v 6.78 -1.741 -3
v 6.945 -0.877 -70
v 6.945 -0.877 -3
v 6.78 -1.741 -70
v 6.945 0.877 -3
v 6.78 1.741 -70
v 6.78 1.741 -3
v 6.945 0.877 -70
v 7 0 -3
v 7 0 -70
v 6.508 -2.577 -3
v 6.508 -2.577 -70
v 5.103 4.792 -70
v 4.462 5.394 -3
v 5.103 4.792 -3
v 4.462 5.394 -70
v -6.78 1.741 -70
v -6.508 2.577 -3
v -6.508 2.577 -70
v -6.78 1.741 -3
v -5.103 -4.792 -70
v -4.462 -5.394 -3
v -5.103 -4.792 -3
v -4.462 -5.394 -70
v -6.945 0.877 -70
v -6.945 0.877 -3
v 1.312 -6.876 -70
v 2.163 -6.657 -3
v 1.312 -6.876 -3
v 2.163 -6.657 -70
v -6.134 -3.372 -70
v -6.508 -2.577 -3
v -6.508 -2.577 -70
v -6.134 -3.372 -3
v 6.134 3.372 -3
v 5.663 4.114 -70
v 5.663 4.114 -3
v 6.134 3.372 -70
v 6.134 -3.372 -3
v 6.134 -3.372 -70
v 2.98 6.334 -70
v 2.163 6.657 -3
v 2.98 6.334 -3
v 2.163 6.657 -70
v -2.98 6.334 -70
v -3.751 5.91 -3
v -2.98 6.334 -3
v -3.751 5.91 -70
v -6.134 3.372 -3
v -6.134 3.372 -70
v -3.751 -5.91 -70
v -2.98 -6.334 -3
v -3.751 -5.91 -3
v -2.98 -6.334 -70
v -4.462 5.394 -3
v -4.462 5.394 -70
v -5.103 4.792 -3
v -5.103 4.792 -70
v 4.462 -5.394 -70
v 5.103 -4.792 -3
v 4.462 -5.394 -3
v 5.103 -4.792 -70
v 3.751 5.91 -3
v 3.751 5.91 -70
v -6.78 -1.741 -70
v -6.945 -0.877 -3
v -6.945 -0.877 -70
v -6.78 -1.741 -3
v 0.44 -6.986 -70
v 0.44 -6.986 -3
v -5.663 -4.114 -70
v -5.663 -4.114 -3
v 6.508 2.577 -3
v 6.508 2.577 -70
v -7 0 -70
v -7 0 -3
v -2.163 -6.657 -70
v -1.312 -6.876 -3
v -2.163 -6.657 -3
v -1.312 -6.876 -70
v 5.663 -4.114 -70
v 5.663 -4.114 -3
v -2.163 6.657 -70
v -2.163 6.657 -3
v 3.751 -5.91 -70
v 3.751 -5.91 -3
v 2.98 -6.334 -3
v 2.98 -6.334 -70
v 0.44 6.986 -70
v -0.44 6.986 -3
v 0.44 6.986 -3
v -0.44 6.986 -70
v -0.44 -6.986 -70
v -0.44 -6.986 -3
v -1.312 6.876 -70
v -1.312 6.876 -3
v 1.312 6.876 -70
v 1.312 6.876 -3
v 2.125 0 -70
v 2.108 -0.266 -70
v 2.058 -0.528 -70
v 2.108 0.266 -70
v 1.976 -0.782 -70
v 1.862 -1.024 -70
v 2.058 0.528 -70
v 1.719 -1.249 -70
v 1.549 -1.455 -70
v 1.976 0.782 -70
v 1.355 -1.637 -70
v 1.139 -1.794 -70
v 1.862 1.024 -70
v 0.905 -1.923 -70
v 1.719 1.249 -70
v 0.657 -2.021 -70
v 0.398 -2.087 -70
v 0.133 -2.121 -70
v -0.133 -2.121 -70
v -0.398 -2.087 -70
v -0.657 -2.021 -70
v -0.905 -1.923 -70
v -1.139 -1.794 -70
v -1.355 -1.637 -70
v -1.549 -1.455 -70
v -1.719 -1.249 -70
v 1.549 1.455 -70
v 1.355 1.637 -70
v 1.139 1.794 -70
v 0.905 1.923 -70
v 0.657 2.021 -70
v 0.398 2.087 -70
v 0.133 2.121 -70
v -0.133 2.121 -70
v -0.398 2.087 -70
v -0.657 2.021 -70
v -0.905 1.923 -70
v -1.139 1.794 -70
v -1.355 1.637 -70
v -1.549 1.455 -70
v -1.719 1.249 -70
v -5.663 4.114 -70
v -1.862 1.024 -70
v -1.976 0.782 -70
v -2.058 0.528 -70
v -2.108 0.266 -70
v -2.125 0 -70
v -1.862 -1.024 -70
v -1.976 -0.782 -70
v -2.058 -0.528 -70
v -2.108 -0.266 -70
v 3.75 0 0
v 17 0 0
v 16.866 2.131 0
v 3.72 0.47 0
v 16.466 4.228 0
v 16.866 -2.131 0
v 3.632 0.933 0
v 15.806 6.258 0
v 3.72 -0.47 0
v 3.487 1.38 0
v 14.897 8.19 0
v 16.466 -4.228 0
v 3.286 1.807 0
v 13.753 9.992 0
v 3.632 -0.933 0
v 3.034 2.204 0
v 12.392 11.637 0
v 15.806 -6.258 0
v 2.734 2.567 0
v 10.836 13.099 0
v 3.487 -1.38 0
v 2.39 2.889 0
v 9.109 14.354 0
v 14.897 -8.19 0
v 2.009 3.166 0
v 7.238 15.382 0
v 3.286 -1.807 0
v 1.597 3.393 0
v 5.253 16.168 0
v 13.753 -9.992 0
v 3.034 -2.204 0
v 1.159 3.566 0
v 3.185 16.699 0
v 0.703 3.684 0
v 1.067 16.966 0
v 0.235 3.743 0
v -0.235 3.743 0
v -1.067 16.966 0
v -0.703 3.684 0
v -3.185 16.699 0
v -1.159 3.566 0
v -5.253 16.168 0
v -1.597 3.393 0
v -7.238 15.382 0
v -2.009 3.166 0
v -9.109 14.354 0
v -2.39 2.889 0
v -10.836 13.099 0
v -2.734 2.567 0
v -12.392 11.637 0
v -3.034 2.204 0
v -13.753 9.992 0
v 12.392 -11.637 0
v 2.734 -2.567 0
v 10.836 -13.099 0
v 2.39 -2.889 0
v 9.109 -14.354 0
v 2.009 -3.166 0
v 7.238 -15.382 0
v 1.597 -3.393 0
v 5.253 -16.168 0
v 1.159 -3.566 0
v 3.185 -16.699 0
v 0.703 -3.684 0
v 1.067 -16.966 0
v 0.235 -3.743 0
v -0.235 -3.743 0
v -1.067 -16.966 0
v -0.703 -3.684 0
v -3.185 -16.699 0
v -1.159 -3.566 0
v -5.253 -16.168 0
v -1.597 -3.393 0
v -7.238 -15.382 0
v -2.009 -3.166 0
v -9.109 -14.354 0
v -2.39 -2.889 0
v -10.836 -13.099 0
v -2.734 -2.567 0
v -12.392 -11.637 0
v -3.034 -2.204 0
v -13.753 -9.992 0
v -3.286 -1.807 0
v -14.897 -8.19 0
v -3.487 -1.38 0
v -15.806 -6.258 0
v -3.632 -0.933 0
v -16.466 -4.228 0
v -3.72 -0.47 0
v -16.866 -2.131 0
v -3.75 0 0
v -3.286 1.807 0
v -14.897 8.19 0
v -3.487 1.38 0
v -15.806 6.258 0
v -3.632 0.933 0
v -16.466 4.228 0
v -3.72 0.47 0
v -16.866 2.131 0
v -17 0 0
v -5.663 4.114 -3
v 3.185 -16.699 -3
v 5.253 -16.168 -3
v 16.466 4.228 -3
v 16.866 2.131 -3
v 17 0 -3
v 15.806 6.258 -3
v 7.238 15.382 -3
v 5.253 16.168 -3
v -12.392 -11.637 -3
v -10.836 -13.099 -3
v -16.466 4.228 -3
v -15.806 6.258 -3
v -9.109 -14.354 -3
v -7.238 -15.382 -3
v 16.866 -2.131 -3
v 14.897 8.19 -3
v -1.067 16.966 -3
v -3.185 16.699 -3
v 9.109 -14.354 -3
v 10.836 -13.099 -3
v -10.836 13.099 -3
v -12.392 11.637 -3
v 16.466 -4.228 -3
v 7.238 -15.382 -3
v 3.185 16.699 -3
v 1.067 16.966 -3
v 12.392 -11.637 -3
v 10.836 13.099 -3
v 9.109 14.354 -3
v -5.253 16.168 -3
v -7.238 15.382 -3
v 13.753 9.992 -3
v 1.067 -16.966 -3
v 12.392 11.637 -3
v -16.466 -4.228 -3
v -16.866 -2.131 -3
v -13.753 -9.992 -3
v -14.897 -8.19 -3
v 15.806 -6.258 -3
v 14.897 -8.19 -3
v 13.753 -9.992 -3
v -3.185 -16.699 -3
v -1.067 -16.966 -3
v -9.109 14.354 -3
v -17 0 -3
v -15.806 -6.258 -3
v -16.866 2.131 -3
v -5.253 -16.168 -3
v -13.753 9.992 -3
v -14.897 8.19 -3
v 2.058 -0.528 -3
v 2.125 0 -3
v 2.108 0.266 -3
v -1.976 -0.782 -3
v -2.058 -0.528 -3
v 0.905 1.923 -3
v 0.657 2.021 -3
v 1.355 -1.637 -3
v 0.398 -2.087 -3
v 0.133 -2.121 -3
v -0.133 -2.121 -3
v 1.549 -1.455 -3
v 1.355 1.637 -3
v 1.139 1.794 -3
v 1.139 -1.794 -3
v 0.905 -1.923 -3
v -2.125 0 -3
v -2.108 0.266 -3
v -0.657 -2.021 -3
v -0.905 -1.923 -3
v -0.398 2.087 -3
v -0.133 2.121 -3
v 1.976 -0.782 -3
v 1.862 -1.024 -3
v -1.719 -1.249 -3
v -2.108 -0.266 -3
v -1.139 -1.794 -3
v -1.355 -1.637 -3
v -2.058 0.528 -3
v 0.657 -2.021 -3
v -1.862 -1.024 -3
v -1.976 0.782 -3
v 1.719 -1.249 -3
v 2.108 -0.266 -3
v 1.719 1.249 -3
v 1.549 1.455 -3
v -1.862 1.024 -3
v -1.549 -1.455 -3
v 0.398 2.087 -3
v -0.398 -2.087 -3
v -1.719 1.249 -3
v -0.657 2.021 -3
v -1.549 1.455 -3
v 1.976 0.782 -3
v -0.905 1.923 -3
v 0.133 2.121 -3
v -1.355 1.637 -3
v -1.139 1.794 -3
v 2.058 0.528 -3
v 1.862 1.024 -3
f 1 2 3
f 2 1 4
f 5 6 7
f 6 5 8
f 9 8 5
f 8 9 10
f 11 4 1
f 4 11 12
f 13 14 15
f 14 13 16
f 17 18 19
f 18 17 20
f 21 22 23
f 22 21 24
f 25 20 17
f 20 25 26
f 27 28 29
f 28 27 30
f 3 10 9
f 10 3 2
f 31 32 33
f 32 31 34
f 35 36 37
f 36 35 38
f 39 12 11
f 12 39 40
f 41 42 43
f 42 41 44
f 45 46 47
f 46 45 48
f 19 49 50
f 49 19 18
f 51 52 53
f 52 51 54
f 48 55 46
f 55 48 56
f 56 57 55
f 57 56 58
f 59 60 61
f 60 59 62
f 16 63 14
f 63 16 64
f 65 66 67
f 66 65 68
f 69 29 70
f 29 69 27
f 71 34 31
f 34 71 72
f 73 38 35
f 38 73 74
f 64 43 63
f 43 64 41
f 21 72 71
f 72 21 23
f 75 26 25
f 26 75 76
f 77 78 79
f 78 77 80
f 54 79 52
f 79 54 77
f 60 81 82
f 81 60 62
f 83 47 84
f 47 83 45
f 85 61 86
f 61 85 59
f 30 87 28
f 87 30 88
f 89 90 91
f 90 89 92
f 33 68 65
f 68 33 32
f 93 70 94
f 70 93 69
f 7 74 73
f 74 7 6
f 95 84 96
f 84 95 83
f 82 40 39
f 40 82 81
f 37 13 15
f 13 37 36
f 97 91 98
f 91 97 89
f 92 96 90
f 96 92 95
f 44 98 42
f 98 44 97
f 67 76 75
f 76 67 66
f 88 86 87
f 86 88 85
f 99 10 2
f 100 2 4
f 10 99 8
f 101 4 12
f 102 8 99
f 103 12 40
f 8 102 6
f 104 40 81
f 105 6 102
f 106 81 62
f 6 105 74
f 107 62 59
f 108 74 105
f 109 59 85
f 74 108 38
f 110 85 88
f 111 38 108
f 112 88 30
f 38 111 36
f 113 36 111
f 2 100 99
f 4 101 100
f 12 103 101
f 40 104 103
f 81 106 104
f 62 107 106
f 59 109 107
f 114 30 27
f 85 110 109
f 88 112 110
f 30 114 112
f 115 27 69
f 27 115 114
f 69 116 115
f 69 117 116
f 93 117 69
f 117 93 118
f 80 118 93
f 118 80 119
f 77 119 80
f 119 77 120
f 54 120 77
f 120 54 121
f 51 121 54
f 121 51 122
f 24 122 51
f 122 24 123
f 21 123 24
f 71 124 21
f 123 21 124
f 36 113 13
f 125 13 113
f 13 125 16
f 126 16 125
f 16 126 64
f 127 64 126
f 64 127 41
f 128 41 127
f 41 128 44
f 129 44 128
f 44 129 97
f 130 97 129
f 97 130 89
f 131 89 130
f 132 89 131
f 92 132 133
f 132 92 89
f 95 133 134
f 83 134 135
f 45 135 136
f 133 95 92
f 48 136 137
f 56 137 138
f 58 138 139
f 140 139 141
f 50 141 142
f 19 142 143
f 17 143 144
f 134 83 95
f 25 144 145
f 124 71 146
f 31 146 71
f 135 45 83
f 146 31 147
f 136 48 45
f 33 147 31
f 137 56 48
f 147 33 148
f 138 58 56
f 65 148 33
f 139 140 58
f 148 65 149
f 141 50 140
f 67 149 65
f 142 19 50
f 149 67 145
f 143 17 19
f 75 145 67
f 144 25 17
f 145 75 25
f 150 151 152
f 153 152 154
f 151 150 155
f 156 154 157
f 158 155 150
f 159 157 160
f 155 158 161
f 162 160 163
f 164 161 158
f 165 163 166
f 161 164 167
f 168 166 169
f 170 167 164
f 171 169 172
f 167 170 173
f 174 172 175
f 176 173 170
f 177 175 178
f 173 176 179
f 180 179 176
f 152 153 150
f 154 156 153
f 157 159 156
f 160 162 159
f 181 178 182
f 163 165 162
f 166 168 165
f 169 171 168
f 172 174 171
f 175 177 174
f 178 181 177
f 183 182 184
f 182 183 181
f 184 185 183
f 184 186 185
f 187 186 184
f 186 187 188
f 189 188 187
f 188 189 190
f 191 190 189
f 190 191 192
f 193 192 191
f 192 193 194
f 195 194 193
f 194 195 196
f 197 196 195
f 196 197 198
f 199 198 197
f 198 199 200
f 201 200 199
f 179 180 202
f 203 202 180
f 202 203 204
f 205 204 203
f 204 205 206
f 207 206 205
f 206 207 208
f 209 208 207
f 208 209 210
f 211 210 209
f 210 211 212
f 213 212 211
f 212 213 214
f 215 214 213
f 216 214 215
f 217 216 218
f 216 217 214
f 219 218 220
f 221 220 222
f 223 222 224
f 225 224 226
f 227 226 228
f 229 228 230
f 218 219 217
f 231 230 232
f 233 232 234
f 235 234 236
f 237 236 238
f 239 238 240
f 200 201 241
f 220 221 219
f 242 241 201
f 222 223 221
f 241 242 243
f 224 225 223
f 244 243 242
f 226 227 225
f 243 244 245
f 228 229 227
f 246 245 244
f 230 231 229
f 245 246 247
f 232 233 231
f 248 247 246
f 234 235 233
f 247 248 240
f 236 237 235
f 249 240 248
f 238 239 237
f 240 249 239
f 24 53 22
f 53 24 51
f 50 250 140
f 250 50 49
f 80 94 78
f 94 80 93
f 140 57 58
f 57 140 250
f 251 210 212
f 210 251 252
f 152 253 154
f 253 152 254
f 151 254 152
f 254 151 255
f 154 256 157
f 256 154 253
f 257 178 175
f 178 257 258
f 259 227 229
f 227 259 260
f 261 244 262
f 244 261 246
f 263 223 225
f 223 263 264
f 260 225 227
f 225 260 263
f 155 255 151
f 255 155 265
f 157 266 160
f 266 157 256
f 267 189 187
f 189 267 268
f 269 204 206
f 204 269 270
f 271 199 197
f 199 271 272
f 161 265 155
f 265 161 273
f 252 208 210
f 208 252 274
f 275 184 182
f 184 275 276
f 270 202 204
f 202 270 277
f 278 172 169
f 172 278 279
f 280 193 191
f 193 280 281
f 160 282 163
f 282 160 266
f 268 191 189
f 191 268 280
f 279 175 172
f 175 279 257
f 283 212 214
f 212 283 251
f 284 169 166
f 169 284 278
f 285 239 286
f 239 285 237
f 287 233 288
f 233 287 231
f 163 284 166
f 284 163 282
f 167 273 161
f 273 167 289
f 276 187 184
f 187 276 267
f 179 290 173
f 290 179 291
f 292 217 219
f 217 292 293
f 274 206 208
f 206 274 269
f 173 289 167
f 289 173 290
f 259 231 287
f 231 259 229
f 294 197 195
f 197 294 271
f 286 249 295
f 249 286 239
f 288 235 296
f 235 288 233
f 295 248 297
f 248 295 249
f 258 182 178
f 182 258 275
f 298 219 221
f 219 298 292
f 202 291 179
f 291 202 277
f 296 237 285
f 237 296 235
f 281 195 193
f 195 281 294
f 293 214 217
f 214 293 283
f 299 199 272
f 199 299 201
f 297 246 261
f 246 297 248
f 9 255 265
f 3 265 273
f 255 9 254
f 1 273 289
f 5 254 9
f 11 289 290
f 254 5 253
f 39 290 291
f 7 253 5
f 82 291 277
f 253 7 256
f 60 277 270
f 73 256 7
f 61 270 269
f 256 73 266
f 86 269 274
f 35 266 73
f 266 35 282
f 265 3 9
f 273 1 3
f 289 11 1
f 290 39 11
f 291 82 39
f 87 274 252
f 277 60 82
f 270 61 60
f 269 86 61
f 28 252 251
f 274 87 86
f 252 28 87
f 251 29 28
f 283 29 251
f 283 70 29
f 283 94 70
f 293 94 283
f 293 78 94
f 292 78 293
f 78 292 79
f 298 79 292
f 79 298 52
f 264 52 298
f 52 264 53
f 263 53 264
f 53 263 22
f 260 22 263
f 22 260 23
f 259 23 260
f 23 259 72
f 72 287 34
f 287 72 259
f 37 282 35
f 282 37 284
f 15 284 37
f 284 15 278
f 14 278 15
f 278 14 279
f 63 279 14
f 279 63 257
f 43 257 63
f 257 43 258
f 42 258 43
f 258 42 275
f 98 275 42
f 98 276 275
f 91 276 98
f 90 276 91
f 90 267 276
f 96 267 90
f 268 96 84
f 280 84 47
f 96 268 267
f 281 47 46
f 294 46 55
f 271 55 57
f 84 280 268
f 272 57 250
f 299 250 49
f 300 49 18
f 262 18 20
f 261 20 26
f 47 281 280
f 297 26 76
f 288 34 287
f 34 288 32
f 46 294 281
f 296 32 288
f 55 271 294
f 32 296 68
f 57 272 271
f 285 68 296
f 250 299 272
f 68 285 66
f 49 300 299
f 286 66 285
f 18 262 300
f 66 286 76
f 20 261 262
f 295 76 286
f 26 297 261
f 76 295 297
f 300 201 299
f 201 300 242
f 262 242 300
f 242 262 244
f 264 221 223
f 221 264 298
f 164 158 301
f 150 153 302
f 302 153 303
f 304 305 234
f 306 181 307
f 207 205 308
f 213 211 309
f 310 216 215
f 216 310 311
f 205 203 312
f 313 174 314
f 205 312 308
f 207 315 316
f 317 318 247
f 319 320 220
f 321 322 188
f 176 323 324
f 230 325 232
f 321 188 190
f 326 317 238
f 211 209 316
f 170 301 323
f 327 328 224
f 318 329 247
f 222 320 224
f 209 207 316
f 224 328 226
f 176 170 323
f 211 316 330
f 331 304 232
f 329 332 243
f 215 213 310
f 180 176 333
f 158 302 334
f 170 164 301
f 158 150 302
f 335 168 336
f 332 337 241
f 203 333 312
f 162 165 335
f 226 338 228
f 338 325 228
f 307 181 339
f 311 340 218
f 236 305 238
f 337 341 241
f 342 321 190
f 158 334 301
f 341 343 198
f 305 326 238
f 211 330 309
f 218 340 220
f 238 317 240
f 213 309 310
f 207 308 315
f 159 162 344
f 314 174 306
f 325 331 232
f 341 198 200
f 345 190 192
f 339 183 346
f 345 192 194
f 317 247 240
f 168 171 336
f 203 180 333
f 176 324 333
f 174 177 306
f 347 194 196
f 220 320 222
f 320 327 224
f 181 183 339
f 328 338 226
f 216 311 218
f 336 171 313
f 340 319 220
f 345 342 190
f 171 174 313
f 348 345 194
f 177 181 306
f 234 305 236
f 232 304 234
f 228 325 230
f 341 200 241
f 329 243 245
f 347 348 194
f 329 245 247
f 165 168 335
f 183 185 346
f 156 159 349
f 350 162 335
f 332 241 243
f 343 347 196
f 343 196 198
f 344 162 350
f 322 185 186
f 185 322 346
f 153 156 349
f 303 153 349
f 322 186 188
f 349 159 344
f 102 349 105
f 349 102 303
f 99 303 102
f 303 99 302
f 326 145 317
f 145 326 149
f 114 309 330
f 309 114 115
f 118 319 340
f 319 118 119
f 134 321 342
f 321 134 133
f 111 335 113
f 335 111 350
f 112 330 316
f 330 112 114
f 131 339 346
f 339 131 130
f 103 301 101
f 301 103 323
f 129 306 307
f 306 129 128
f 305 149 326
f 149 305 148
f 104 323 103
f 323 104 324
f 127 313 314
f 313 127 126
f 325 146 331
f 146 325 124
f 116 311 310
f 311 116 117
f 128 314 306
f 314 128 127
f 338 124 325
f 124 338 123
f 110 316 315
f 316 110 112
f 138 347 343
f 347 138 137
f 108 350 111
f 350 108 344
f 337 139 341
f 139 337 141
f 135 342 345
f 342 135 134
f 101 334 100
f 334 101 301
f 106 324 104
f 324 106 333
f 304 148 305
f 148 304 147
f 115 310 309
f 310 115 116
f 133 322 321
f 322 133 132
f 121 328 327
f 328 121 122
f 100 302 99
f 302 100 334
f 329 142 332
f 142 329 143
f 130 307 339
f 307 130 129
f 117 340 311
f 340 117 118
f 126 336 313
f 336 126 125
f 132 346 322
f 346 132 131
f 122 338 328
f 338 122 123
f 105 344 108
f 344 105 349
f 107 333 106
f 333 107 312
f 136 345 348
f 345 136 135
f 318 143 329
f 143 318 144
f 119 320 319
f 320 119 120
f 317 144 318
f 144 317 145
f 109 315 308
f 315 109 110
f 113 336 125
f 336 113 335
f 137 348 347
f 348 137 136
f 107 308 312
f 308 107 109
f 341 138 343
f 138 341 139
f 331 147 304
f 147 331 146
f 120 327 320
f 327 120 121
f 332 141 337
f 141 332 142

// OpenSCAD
$fn = 50;


difference() {
	union() {
		translate(v = [0, 0, -70.0000000000]) {
			cylinder(h = 70, r = 7.0000000000);
		}
		translate(v = [0, 0, -3.0000000000]) {
			cylinder(h = 3, r = 17.0000000000);
		}
	}
	union() {
		translate(v = [0, 0, 0]) {
			rotate(a = [0, 0, 0]) {
				difference() {
					union() {
						#translate(v = [0, 0, -70.0000000000]) {
							cylinder(h = 70, r = 2.0000000000);
						}
						#translate(v = [0, 0, -3]) {
							cylinder(h = 3, r = 7.0000000000, r1 = 2.1250000000, r2 = 3.7500000000);
						}
						#translate(v = [0, 0, -70.0000000000]) {
							cylinder(h = 70, r = 2.1250000000);
						}
						#translate(v = [0, 0, -70.0000000000]) {
							cylinder(h = 70, r = 2.0000000000);
						}
					}
					union();
				}
			}
		}
	}
}
